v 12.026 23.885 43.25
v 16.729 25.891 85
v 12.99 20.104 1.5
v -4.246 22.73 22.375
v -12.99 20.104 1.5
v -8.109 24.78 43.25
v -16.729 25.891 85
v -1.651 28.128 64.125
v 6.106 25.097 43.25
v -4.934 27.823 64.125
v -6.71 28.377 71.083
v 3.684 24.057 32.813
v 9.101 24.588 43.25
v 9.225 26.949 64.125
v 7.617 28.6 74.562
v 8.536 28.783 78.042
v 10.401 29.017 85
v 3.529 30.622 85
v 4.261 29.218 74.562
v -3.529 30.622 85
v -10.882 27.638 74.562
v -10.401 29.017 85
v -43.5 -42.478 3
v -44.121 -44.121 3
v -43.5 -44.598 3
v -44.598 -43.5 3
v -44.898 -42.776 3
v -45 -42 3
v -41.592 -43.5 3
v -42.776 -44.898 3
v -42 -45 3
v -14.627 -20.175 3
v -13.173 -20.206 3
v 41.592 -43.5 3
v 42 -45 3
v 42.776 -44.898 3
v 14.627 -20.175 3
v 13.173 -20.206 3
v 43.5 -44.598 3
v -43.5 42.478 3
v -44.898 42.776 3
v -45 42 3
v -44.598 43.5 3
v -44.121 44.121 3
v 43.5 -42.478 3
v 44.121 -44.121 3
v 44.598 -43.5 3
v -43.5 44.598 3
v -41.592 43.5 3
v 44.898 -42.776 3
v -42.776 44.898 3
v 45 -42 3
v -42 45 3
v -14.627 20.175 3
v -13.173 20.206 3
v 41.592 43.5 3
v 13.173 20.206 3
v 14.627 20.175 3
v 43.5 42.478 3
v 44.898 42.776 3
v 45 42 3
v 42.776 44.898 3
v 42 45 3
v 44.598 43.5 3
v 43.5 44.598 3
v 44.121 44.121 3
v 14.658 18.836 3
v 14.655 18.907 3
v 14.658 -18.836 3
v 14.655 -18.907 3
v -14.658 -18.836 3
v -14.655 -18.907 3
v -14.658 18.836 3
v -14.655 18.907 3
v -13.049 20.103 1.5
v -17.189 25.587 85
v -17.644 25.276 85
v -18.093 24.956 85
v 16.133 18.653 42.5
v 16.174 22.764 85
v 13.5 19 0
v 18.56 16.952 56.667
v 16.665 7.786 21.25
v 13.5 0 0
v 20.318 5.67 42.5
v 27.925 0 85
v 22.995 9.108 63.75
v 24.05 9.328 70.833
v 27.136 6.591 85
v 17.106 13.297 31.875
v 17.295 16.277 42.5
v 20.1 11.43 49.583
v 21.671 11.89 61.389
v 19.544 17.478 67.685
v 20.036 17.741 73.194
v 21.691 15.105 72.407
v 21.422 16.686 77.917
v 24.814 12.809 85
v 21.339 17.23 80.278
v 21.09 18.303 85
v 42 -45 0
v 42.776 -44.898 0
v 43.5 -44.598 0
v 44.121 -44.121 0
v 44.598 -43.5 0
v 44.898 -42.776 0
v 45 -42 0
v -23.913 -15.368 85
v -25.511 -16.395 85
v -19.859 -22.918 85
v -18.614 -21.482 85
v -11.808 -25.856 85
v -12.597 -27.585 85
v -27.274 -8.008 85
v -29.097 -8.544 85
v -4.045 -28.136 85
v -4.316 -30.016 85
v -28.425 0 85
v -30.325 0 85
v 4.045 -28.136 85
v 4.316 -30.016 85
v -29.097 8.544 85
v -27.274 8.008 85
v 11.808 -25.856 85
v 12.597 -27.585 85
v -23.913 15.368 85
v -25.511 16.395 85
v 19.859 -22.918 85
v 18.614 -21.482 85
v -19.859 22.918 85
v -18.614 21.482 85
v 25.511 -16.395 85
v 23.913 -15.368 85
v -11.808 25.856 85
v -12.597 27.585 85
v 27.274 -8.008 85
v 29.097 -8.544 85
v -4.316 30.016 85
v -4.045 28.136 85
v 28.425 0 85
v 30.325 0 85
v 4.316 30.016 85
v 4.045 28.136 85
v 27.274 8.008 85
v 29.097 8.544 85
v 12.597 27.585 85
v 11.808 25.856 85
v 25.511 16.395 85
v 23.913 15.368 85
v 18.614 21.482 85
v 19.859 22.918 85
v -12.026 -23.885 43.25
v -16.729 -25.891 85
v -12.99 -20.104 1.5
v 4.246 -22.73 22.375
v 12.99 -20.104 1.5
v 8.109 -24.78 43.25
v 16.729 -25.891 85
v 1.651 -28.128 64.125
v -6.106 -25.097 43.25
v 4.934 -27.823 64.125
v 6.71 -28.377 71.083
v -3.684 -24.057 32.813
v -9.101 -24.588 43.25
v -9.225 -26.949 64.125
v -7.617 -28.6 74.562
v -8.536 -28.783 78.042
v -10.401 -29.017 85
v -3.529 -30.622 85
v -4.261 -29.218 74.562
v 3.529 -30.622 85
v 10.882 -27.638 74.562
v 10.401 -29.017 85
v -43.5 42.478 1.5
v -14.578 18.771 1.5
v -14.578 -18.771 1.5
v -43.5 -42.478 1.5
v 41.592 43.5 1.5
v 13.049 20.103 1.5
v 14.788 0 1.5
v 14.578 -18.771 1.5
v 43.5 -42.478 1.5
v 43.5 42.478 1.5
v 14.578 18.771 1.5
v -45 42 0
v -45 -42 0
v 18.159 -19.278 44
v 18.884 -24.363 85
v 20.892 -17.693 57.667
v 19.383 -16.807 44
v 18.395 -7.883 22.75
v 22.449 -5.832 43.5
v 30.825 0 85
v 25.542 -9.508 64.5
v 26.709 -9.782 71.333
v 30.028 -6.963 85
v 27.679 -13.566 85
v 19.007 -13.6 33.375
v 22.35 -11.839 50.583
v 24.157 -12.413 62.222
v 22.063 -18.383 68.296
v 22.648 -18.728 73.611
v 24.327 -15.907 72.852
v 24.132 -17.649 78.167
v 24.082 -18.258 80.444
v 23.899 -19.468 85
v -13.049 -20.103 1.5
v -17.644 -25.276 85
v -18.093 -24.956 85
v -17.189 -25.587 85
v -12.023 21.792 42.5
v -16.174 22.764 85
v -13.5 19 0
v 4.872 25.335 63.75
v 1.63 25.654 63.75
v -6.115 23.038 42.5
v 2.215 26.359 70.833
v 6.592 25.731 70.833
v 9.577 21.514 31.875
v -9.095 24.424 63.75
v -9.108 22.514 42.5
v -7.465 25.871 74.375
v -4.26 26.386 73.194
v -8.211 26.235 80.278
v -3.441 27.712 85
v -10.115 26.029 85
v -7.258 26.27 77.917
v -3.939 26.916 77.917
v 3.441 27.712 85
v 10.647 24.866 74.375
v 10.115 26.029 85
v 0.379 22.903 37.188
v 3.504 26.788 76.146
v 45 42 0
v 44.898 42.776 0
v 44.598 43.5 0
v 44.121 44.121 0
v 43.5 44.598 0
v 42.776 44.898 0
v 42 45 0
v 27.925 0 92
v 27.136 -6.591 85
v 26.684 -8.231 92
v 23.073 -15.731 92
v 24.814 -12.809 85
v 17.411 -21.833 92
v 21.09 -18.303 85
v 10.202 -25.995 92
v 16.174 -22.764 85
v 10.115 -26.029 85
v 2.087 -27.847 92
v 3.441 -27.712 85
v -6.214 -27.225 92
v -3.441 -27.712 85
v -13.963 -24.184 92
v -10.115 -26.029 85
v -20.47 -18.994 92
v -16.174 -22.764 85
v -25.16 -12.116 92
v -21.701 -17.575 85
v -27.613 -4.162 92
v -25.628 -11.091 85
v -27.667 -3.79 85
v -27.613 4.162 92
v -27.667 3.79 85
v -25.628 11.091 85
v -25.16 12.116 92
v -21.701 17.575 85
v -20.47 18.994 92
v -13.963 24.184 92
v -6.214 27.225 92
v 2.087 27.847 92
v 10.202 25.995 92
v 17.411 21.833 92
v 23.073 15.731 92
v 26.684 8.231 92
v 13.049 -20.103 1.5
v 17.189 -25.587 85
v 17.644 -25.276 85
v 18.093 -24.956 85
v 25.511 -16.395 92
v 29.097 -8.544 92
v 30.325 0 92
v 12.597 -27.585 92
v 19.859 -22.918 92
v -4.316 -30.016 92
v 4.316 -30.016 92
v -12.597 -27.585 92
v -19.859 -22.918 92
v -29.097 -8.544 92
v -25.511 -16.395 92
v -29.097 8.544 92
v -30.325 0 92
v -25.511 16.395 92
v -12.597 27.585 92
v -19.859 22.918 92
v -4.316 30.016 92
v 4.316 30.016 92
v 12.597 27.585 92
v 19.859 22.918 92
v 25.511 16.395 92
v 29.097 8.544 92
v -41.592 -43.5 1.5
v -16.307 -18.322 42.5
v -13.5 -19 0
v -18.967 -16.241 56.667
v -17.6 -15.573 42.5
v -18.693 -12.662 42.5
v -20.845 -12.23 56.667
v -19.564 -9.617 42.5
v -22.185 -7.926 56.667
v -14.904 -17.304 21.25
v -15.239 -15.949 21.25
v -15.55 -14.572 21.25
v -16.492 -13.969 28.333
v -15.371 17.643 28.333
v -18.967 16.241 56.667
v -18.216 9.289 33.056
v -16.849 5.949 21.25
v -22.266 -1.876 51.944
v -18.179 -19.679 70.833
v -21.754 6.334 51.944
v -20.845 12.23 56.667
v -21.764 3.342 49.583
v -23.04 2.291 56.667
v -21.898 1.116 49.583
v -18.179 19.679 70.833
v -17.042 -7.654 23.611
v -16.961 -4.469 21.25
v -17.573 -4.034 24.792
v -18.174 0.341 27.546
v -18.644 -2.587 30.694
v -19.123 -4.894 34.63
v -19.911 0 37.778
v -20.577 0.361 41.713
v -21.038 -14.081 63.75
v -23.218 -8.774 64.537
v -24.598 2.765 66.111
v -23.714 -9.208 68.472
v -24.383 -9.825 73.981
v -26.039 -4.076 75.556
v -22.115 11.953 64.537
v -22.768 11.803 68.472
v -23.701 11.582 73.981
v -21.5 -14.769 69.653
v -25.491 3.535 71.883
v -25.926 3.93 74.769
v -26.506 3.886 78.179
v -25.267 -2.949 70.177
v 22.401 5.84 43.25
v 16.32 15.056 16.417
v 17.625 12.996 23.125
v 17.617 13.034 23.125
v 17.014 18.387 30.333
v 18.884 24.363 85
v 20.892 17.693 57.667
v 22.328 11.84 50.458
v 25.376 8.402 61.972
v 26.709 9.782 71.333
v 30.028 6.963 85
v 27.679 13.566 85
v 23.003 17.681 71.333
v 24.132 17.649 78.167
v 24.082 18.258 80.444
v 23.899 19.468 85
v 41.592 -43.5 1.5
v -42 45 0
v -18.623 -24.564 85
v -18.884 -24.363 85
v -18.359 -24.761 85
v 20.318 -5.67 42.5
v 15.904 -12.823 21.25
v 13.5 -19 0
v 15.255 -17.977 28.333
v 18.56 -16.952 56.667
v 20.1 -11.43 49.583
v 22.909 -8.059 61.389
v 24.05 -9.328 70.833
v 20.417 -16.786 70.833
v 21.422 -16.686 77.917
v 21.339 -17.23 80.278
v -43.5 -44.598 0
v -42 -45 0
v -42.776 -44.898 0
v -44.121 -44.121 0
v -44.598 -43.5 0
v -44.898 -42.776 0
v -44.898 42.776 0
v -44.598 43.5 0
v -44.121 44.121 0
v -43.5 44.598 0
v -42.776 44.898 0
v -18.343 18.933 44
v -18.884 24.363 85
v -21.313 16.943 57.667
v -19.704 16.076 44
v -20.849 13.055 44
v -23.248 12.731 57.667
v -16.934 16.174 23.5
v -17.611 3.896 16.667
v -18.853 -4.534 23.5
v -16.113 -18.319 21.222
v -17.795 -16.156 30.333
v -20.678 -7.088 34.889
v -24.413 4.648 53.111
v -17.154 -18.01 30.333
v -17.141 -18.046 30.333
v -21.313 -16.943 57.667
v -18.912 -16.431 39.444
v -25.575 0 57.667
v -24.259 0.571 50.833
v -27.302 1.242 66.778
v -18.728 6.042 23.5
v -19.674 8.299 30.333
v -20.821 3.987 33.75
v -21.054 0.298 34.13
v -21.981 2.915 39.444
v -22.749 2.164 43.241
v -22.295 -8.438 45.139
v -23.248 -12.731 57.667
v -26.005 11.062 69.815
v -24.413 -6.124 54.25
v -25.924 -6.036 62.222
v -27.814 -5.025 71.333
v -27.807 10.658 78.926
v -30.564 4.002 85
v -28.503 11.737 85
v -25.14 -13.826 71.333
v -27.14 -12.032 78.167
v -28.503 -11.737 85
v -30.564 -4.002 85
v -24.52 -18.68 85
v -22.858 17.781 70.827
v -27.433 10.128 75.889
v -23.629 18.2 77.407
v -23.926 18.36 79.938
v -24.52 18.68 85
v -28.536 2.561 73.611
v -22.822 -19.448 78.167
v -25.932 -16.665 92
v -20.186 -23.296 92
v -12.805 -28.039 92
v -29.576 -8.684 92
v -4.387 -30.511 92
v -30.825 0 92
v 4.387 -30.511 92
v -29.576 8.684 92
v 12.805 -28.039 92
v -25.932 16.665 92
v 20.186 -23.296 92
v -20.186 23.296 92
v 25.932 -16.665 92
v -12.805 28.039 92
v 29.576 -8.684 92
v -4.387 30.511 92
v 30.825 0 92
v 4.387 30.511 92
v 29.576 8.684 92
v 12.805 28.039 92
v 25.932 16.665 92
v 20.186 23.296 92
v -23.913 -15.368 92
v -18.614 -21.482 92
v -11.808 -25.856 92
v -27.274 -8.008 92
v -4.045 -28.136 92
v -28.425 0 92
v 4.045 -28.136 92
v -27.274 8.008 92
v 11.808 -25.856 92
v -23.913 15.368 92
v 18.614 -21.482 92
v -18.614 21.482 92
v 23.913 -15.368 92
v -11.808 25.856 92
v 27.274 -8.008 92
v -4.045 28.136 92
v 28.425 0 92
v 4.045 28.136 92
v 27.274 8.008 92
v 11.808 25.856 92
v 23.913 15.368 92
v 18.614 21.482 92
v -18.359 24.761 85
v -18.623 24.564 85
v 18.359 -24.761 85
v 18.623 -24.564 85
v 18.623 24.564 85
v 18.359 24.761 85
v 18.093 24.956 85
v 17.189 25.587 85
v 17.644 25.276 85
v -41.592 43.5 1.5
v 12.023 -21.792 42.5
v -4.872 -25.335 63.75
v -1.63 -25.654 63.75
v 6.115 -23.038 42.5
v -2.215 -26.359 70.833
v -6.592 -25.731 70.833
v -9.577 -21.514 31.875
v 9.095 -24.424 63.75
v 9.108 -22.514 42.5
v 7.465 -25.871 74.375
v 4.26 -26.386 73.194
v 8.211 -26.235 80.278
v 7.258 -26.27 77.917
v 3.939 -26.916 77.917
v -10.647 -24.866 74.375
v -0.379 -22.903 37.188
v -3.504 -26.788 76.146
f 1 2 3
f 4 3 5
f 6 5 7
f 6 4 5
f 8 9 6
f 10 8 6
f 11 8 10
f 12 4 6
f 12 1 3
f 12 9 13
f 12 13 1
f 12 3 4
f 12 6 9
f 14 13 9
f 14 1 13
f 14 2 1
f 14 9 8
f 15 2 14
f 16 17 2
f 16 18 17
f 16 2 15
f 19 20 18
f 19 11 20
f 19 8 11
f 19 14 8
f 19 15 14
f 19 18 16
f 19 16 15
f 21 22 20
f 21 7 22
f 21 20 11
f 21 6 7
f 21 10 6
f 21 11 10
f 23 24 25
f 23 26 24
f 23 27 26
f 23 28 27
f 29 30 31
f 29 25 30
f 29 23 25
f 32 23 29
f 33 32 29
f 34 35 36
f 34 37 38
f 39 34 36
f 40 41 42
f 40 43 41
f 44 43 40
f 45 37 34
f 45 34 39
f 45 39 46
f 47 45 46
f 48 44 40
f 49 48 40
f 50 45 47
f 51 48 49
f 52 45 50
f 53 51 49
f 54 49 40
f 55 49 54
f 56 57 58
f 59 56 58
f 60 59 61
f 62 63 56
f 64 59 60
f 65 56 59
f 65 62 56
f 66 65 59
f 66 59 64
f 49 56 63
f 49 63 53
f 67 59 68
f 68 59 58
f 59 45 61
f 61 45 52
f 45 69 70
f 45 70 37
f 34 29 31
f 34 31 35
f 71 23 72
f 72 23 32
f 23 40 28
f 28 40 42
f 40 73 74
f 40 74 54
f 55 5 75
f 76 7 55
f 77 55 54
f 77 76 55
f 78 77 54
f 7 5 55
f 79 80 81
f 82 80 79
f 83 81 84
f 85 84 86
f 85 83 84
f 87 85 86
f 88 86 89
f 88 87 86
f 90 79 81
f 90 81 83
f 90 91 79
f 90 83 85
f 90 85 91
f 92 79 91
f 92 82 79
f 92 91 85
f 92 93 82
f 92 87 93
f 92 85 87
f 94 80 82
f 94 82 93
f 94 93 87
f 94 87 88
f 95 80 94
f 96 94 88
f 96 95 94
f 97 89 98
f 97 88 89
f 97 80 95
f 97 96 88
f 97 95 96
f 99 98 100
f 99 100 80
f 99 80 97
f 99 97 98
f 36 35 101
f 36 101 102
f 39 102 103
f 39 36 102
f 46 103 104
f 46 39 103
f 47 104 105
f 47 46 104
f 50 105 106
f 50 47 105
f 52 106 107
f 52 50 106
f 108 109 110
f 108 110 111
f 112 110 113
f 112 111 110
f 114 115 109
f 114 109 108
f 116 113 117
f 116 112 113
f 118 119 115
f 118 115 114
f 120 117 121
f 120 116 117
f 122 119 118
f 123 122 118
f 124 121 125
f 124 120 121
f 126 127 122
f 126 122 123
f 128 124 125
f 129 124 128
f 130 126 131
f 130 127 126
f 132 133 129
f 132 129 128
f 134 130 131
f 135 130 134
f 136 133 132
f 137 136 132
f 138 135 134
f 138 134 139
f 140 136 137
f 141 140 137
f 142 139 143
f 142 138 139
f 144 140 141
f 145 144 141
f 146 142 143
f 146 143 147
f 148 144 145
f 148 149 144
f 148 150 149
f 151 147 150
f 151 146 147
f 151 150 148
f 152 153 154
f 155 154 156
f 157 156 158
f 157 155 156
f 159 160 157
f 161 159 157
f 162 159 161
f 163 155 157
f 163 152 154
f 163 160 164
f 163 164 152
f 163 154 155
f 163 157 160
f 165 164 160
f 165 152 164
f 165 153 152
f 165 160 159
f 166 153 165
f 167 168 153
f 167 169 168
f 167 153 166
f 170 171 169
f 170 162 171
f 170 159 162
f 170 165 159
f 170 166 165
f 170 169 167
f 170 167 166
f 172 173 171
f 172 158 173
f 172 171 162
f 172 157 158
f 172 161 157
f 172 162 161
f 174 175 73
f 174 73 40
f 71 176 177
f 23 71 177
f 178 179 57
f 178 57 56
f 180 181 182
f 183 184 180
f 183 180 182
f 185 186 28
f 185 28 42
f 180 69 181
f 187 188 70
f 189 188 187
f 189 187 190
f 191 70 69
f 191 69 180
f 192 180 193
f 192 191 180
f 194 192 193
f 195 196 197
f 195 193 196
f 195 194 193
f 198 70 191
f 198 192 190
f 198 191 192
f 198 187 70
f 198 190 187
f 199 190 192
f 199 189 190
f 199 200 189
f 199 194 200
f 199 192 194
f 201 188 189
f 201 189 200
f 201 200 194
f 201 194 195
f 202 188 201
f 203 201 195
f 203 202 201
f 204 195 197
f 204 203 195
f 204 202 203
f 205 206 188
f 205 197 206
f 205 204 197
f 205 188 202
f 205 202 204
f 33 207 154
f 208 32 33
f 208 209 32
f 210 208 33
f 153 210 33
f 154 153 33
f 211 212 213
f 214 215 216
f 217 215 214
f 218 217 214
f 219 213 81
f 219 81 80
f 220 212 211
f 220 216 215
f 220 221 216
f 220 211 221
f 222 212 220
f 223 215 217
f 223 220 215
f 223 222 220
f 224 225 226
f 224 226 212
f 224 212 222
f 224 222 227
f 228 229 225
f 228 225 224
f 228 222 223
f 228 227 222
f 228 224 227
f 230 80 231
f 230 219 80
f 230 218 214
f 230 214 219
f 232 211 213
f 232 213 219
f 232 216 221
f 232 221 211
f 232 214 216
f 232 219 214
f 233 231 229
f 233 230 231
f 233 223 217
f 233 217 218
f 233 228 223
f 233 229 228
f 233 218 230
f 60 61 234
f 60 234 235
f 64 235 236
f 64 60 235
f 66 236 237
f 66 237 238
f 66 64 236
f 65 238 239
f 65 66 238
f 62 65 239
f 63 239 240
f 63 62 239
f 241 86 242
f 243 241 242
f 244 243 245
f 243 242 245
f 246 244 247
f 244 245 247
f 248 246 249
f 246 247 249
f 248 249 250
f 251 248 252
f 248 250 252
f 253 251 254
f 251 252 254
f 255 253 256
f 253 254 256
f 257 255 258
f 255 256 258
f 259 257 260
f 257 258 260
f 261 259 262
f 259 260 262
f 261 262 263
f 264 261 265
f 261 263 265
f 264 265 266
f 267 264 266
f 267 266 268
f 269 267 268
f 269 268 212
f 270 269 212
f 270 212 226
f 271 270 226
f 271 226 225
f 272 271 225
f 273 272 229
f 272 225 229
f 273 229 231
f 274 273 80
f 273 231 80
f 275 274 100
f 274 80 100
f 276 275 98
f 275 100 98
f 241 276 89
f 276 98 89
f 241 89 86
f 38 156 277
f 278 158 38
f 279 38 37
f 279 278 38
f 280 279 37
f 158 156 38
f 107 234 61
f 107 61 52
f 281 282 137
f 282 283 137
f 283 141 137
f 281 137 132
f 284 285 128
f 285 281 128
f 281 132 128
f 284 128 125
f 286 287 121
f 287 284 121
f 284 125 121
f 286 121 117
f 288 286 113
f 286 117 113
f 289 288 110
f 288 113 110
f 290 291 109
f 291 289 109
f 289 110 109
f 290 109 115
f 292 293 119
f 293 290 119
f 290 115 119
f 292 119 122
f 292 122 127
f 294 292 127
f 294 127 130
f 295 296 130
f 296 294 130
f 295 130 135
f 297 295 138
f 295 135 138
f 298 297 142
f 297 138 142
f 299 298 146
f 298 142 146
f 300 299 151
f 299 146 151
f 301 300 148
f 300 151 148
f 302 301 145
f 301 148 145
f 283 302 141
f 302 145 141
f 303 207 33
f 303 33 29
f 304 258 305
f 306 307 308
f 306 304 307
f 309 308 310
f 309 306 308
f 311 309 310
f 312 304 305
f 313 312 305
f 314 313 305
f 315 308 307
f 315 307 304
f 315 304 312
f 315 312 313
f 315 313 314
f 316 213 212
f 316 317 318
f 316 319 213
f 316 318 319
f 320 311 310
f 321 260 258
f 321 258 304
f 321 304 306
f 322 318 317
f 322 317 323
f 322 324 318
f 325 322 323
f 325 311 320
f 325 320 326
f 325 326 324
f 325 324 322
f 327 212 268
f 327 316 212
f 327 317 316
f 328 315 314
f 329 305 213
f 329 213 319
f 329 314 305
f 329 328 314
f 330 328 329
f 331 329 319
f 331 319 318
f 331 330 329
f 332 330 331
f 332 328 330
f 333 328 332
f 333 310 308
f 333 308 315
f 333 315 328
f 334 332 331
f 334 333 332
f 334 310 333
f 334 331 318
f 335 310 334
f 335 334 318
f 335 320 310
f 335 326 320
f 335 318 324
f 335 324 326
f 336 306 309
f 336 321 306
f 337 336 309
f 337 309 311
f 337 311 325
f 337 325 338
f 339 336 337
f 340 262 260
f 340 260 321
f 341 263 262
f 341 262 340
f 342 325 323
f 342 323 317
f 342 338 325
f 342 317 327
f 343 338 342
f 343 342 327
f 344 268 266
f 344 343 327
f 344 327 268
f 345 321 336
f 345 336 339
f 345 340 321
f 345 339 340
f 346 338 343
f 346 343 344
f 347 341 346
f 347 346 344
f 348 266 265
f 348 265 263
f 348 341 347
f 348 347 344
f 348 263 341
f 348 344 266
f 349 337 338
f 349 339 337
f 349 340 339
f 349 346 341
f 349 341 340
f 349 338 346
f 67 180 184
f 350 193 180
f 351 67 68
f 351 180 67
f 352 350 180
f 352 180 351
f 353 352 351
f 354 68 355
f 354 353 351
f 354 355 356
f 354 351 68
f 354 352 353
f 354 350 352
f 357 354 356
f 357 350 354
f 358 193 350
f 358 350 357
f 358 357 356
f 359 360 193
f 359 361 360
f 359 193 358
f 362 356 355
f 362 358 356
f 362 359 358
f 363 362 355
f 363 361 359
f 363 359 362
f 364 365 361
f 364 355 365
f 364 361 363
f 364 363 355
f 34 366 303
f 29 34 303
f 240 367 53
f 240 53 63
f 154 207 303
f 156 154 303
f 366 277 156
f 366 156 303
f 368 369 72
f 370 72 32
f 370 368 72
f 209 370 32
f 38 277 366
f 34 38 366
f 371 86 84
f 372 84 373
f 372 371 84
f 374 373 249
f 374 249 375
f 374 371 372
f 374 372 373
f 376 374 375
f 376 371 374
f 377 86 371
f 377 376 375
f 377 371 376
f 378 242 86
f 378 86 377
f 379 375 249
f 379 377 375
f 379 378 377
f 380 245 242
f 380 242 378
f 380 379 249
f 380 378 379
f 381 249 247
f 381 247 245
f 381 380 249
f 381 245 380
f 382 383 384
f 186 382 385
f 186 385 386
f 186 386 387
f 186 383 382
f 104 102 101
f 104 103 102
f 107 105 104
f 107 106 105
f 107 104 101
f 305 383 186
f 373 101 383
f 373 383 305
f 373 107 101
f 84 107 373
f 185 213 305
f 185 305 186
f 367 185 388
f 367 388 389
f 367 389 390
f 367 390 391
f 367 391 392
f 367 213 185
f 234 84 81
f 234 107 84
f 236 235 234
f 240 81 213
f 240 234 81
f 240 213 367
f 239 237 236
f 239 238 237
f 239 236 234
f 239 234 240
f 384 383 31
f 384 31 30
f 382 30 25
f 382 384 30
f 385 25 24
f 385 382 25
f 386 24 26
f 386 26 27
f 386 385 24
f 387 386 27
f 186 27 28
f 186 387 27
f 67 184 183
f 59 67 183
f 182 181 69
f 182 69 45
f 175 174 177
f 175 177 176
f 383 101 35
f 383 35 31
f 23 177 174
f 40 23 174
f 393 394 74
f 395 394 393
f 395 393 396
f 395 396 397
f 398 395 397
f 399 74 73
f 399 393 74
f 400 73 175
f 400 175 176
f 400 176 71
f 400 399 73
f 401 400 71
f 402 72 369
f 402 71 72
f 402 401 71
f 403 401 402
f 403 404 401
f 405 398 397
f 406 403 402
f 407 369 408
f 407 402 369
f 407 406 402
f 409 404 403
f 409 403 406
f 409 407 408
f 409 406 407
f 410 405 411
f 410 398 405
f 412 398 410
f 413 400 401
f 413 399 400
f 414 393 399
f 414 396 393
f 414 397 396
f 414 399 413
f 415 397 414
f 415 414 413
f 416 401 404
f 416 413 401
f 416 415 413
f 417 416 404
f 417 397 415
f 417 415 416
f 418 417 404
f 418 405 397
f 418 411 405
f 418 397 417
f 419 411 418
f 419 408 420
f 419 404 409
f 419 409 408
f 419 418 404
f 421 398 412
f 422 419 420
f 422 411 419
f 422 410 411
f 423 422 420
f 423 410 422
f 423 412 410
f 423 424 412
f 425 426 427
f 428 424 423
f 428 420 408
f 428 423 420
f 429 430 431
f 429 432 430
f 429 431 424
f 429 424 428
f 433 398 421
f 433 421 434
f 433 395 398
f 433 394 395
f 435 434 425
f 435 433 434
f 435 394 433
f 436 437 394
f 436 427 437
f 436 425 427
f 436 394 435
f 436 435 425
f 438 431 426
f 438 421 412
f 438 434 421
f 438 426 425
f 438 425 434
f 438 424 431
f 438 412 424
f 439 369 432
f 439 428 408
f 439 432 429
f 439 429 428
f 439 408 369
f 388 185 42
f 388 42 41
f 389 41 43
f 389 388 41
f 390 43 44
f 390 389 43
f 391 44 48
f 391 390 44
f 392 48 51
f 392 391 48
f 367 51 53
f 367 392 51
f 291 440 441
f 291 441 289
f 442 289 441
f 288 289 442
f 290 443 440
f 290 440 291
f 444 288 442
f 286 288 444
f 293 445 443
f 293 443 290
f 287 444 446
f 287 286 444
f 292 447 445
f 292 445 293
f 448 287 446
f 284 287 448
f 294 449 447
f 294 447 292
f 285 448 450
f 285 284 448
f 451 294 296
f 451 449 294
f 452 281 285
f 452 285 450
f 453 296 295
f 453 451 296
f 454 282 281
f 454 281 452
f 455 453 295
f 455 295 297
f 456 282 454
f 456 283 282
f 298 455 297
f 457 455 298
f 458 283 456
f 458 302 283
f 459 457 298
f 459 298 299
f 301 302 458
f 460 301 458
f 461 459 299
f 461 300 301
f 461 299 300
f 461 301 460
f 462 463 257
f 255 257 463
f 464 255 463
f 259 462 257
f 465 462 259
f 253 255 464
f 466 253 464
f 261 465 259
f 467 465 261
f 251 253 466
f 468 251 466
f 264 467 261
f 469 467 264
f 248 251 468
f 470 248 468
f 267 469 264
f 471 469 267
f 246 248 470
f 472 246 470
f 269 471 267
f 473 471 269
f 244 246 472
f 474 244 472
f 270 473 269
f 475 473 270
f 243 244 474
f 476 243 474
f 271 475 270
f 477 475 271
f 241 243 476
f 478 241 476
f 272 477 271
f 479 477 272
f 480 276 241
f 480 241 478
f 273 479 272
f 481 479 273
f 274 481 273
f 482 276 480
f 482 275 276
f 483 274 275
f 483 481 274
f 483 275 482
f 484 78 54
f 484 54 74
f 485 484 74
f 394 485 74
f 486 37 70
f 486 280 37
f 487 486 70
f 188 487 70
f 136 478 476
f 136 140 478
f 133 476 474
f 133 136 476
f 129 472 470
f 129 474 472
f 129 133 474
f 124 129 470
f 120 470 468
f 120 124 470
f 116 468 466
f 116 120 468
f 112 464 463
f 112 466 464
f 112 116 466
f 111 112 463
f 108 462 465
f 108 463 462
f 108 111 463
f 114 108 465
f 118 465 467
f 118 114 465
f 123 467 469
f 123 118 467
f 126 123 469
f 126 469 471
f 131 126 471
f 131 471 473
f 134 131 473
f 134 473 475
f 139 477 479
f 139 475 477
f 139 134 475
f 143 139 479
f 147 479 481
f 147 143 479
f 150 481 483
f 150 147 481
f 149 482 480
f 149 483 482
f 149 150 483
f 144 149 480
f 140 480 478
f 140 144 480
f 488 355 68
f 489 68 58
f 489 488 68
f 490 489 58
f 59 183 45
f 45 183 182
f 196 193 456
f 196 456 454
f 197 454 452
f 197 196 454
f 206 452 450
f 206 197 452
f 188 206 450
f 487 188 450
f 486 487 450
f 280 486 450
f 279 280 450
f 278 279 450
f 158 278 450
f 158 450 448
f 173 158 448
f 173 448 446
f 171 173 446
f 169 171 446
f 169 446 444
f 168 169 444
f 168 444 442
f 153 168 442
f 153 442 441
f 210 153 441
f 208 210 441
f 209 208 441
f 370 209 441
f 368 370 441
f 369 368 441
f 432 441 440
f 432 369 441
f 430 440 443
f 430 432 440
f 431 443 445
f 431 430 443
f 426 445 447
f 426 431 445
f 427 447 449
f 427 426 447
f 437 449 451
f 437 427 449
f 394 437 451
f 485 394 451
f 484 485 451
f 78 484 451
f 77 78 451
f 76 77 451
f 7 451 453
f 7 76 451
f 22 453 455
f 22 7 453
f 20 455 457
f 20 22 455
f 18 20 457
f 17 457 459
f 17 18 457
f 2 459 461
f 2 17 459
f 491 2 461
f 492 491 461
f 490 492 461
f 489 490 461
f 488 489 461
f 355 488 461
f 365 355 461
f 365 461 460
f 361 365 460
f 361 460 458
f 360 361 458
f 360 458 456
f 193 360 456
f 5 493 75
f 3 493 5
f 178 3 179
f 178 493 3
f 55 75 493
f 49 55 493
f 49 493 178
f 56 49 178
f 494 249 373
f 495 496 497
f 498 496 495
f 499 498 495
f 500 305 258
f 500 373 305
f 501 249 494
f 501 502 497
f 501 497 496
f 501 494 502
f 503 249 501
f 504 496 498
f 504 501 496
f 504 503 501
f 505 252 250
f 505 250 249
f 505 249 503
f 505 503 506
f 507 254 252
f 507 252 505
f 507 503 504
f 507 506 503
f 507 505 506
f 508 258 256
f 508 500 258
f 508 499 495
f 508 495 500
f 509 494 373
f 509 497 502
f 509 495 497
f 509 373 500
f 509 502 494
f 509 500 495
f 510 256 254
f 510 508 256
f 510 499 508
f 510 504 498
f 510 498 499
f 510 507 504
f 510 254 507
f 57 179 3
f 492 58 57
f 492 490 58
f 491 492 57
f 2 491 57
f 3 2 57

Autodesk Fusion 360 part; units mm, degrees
sketch "Sketch1" plane through (0, 0, 0) normal (0, 0, 1) x (1, 0, 0)
  line L0 (-13.5, 19) -> (13.5, 19)
  line L1 (13.5, 19) -> (13.5, -19)
  line L2 (13.5, -19) -> (-13.5, -19)
  line L3 (-13.5, -19) -> (-13.5, 19)
  line L4 (-13.5, 19) -> (13.5, -19) construction
  line L5 (14.5, -20) -> (-14.5, -20)
  line L6 (-14.5, -20) -> (-14.5, 20)
  line L7 (-14.5, 20) -> (14.5, 20)
  line L8 (14.5, 20) -> (14.5, -20)
  line L9 (-45, 45) -> (45, 45)
  line L10 (45, 45) -> (45, -45)
  line L11 (45, -45) -> (-45, -45)
  line L12 (-45, -45) -> (-45, 45)
  line L13 (-45, 45) -> (45, -45) construction
  line L14 (-14.5, -20) -> (-45, -45)
  line L15 (-14.5, 20) -> (-45, 45)
  line L16 (14.5, 20) -> (45, 45)
  line L17 (14.5, -20) -> (45, -45)
  line L18 (-43.5, 43.5) -> (43.5, 43.5)
  line L19 (43.5, 43.5) -> (43.5, -43.5)
  line L20 (43.5, -43.5) -> (-43.5, -43.5)
  line L21 (-43.5, -43.5) -> (-43.5, 43.5)
  line L22 (-12.9225, 20) -> (-41.5925, 43.5)
  line L23 (-14.5, 18.707) -> (-43.5, 42.4775)
  line L24 (14.5, 18.707) -> (43.5, 42.4775)
  line L25 (12.9225, 20) -> (41.5925, 43.5)
  line L26 (12.9225, -20) -> (41.5925, -43.5)
  line L27 (14.5, -18.707) -> (43.5, -42.4775)
  line L28 (-14.5, -18.707) -> (-43.5, -42.4775)
  line L29 (-12.9225, -20) -> (-41.5925, -43.5)
  dimension "d5" = 27
  dimension "d6" = 38
  dimension "d15" = 90
  dimension "d16" = 90
  dimension "d44" = 1.5
ref_plane "WorkPlane1" through (0, 0, 85) normal (0, 0, 1) x (1, 0, 0)
sketch "Sketch2" plane through (0, 0, 85) normal (0, 0, 1) x (1, 0, 0)
  circle A0 centre (0, 0) radius 28.425
  circle A1 centre (0, 0) radius 30.325
  circle A2 centre (0, 0) radius 27.925
  circle A3 centre (0, 0) radius 30.825
  dimension "d10" = 56.85
  dimension "d11" = 60.65
  dimension "d13" = -0.5
  dimension "d14" = 0.5
loft "Loft3" add profiles "Sketch1", "Sketch2" section 1 contours L5 L6 L7 L8 section 2 contours A0 | A1 | A3 makes body 1
loft "Loft4" cut profiles "Sketch2", "Sketch1" section 1 contours A2 section 2 contours L0 L1 L2 L3 bodies 1
extrude "Extrude3" add sketch "Sketch1" along normal blind 1.5 separate body contours L5 L17 L20 L26 | L8 L17 L19 L20 L27 | L5 L20 L26 L29 | L8 L19 L24 L27 | L10 L16 L17 L18 L19 L20 | L11 L14 L17 L20 | L5 L14 L20 L29 | L8 L16 L18 L19 L24 | L6 L14 L20 L21 L28 | L7 L16 L18 L25 | L9 L15 L16 L18 | L12 L14 L15 L18 L20 L21 | L6 L21 L23 L28 | L7 L18 L22 L25 | L6 L15 L18 L21 L23 | L7 L15 L18 L22 makes body 2
extrude "Extrude4" add sketch "Sketch2" along normal blind 7 bodies 1
extrude "Extrude7" add sketch "Sketch1" along normal blind 3 contours L5 L17 L20 L26 | L8 L17 L19 L20 L27 | L10 L16 L17 L18 L19 L20 | L11 L14 L17 L20 | L5 L14 L20 L29 | L8 L16 L18 L19 L24 | L6 L14 L20 L21 L28 | L7 L16 L18 L25 | L9 L15 L16 L18 | L12 L14 L15 L18 L20 L21 | L6 L15 L18 L21 L23 | L7 L15 L18 L22 bodies 1 2
fillet "Fillet1" radius 3 4 edges at (45, -45, 1.5) (-45, -45, 1.5) (-45, 45, 1.5) (45, 45, 1.5) on bodies 1
equation "aparture_x = 27 mm"
equation "aparture_y = 38 mm"
equation "tube_height = 85 mm"
equation "hood_lip_wall_thickness = 1 mm"
equation "d5 = aparture_x"
equation "d6 = aparture_y"
equation "d7 = tube_height"
equation "hood_inner_dia = 57 mm"
equation "hood_outer_dia = 60.5 mm"
equation "d10 = hood_inner_dia - hood_tolerance / 2"
equation "d11 = hood_outer_dia + hood_tolerance / 2"
equation "d13 = -hood_lip_wall_thickness / 2"
equation "d14 = hood_lip_wall_thickness / 2"
equation "d15 = raft_y"
equation "d16 = raft_x"
equation "raft_height = 1.5 mm"
equation "d22 = raft_height"
equation "hood_lip_height = 7 mm"
equation "d25 = hood_lip_height"
equation "raft_x = 90 mm"
equation "raft_y = 90 mm"
equation "rib_width = 1.5 mm"
equation "d44 = rib_width"
equation "rib_height = 1.5 mm"
equation "d54 = raft_height + rib_height"
equation "round_corner_radius = 3 mm"
equation "d58 = round_corner_radius"
equation "hood_tolerance = 0.3 mm"
